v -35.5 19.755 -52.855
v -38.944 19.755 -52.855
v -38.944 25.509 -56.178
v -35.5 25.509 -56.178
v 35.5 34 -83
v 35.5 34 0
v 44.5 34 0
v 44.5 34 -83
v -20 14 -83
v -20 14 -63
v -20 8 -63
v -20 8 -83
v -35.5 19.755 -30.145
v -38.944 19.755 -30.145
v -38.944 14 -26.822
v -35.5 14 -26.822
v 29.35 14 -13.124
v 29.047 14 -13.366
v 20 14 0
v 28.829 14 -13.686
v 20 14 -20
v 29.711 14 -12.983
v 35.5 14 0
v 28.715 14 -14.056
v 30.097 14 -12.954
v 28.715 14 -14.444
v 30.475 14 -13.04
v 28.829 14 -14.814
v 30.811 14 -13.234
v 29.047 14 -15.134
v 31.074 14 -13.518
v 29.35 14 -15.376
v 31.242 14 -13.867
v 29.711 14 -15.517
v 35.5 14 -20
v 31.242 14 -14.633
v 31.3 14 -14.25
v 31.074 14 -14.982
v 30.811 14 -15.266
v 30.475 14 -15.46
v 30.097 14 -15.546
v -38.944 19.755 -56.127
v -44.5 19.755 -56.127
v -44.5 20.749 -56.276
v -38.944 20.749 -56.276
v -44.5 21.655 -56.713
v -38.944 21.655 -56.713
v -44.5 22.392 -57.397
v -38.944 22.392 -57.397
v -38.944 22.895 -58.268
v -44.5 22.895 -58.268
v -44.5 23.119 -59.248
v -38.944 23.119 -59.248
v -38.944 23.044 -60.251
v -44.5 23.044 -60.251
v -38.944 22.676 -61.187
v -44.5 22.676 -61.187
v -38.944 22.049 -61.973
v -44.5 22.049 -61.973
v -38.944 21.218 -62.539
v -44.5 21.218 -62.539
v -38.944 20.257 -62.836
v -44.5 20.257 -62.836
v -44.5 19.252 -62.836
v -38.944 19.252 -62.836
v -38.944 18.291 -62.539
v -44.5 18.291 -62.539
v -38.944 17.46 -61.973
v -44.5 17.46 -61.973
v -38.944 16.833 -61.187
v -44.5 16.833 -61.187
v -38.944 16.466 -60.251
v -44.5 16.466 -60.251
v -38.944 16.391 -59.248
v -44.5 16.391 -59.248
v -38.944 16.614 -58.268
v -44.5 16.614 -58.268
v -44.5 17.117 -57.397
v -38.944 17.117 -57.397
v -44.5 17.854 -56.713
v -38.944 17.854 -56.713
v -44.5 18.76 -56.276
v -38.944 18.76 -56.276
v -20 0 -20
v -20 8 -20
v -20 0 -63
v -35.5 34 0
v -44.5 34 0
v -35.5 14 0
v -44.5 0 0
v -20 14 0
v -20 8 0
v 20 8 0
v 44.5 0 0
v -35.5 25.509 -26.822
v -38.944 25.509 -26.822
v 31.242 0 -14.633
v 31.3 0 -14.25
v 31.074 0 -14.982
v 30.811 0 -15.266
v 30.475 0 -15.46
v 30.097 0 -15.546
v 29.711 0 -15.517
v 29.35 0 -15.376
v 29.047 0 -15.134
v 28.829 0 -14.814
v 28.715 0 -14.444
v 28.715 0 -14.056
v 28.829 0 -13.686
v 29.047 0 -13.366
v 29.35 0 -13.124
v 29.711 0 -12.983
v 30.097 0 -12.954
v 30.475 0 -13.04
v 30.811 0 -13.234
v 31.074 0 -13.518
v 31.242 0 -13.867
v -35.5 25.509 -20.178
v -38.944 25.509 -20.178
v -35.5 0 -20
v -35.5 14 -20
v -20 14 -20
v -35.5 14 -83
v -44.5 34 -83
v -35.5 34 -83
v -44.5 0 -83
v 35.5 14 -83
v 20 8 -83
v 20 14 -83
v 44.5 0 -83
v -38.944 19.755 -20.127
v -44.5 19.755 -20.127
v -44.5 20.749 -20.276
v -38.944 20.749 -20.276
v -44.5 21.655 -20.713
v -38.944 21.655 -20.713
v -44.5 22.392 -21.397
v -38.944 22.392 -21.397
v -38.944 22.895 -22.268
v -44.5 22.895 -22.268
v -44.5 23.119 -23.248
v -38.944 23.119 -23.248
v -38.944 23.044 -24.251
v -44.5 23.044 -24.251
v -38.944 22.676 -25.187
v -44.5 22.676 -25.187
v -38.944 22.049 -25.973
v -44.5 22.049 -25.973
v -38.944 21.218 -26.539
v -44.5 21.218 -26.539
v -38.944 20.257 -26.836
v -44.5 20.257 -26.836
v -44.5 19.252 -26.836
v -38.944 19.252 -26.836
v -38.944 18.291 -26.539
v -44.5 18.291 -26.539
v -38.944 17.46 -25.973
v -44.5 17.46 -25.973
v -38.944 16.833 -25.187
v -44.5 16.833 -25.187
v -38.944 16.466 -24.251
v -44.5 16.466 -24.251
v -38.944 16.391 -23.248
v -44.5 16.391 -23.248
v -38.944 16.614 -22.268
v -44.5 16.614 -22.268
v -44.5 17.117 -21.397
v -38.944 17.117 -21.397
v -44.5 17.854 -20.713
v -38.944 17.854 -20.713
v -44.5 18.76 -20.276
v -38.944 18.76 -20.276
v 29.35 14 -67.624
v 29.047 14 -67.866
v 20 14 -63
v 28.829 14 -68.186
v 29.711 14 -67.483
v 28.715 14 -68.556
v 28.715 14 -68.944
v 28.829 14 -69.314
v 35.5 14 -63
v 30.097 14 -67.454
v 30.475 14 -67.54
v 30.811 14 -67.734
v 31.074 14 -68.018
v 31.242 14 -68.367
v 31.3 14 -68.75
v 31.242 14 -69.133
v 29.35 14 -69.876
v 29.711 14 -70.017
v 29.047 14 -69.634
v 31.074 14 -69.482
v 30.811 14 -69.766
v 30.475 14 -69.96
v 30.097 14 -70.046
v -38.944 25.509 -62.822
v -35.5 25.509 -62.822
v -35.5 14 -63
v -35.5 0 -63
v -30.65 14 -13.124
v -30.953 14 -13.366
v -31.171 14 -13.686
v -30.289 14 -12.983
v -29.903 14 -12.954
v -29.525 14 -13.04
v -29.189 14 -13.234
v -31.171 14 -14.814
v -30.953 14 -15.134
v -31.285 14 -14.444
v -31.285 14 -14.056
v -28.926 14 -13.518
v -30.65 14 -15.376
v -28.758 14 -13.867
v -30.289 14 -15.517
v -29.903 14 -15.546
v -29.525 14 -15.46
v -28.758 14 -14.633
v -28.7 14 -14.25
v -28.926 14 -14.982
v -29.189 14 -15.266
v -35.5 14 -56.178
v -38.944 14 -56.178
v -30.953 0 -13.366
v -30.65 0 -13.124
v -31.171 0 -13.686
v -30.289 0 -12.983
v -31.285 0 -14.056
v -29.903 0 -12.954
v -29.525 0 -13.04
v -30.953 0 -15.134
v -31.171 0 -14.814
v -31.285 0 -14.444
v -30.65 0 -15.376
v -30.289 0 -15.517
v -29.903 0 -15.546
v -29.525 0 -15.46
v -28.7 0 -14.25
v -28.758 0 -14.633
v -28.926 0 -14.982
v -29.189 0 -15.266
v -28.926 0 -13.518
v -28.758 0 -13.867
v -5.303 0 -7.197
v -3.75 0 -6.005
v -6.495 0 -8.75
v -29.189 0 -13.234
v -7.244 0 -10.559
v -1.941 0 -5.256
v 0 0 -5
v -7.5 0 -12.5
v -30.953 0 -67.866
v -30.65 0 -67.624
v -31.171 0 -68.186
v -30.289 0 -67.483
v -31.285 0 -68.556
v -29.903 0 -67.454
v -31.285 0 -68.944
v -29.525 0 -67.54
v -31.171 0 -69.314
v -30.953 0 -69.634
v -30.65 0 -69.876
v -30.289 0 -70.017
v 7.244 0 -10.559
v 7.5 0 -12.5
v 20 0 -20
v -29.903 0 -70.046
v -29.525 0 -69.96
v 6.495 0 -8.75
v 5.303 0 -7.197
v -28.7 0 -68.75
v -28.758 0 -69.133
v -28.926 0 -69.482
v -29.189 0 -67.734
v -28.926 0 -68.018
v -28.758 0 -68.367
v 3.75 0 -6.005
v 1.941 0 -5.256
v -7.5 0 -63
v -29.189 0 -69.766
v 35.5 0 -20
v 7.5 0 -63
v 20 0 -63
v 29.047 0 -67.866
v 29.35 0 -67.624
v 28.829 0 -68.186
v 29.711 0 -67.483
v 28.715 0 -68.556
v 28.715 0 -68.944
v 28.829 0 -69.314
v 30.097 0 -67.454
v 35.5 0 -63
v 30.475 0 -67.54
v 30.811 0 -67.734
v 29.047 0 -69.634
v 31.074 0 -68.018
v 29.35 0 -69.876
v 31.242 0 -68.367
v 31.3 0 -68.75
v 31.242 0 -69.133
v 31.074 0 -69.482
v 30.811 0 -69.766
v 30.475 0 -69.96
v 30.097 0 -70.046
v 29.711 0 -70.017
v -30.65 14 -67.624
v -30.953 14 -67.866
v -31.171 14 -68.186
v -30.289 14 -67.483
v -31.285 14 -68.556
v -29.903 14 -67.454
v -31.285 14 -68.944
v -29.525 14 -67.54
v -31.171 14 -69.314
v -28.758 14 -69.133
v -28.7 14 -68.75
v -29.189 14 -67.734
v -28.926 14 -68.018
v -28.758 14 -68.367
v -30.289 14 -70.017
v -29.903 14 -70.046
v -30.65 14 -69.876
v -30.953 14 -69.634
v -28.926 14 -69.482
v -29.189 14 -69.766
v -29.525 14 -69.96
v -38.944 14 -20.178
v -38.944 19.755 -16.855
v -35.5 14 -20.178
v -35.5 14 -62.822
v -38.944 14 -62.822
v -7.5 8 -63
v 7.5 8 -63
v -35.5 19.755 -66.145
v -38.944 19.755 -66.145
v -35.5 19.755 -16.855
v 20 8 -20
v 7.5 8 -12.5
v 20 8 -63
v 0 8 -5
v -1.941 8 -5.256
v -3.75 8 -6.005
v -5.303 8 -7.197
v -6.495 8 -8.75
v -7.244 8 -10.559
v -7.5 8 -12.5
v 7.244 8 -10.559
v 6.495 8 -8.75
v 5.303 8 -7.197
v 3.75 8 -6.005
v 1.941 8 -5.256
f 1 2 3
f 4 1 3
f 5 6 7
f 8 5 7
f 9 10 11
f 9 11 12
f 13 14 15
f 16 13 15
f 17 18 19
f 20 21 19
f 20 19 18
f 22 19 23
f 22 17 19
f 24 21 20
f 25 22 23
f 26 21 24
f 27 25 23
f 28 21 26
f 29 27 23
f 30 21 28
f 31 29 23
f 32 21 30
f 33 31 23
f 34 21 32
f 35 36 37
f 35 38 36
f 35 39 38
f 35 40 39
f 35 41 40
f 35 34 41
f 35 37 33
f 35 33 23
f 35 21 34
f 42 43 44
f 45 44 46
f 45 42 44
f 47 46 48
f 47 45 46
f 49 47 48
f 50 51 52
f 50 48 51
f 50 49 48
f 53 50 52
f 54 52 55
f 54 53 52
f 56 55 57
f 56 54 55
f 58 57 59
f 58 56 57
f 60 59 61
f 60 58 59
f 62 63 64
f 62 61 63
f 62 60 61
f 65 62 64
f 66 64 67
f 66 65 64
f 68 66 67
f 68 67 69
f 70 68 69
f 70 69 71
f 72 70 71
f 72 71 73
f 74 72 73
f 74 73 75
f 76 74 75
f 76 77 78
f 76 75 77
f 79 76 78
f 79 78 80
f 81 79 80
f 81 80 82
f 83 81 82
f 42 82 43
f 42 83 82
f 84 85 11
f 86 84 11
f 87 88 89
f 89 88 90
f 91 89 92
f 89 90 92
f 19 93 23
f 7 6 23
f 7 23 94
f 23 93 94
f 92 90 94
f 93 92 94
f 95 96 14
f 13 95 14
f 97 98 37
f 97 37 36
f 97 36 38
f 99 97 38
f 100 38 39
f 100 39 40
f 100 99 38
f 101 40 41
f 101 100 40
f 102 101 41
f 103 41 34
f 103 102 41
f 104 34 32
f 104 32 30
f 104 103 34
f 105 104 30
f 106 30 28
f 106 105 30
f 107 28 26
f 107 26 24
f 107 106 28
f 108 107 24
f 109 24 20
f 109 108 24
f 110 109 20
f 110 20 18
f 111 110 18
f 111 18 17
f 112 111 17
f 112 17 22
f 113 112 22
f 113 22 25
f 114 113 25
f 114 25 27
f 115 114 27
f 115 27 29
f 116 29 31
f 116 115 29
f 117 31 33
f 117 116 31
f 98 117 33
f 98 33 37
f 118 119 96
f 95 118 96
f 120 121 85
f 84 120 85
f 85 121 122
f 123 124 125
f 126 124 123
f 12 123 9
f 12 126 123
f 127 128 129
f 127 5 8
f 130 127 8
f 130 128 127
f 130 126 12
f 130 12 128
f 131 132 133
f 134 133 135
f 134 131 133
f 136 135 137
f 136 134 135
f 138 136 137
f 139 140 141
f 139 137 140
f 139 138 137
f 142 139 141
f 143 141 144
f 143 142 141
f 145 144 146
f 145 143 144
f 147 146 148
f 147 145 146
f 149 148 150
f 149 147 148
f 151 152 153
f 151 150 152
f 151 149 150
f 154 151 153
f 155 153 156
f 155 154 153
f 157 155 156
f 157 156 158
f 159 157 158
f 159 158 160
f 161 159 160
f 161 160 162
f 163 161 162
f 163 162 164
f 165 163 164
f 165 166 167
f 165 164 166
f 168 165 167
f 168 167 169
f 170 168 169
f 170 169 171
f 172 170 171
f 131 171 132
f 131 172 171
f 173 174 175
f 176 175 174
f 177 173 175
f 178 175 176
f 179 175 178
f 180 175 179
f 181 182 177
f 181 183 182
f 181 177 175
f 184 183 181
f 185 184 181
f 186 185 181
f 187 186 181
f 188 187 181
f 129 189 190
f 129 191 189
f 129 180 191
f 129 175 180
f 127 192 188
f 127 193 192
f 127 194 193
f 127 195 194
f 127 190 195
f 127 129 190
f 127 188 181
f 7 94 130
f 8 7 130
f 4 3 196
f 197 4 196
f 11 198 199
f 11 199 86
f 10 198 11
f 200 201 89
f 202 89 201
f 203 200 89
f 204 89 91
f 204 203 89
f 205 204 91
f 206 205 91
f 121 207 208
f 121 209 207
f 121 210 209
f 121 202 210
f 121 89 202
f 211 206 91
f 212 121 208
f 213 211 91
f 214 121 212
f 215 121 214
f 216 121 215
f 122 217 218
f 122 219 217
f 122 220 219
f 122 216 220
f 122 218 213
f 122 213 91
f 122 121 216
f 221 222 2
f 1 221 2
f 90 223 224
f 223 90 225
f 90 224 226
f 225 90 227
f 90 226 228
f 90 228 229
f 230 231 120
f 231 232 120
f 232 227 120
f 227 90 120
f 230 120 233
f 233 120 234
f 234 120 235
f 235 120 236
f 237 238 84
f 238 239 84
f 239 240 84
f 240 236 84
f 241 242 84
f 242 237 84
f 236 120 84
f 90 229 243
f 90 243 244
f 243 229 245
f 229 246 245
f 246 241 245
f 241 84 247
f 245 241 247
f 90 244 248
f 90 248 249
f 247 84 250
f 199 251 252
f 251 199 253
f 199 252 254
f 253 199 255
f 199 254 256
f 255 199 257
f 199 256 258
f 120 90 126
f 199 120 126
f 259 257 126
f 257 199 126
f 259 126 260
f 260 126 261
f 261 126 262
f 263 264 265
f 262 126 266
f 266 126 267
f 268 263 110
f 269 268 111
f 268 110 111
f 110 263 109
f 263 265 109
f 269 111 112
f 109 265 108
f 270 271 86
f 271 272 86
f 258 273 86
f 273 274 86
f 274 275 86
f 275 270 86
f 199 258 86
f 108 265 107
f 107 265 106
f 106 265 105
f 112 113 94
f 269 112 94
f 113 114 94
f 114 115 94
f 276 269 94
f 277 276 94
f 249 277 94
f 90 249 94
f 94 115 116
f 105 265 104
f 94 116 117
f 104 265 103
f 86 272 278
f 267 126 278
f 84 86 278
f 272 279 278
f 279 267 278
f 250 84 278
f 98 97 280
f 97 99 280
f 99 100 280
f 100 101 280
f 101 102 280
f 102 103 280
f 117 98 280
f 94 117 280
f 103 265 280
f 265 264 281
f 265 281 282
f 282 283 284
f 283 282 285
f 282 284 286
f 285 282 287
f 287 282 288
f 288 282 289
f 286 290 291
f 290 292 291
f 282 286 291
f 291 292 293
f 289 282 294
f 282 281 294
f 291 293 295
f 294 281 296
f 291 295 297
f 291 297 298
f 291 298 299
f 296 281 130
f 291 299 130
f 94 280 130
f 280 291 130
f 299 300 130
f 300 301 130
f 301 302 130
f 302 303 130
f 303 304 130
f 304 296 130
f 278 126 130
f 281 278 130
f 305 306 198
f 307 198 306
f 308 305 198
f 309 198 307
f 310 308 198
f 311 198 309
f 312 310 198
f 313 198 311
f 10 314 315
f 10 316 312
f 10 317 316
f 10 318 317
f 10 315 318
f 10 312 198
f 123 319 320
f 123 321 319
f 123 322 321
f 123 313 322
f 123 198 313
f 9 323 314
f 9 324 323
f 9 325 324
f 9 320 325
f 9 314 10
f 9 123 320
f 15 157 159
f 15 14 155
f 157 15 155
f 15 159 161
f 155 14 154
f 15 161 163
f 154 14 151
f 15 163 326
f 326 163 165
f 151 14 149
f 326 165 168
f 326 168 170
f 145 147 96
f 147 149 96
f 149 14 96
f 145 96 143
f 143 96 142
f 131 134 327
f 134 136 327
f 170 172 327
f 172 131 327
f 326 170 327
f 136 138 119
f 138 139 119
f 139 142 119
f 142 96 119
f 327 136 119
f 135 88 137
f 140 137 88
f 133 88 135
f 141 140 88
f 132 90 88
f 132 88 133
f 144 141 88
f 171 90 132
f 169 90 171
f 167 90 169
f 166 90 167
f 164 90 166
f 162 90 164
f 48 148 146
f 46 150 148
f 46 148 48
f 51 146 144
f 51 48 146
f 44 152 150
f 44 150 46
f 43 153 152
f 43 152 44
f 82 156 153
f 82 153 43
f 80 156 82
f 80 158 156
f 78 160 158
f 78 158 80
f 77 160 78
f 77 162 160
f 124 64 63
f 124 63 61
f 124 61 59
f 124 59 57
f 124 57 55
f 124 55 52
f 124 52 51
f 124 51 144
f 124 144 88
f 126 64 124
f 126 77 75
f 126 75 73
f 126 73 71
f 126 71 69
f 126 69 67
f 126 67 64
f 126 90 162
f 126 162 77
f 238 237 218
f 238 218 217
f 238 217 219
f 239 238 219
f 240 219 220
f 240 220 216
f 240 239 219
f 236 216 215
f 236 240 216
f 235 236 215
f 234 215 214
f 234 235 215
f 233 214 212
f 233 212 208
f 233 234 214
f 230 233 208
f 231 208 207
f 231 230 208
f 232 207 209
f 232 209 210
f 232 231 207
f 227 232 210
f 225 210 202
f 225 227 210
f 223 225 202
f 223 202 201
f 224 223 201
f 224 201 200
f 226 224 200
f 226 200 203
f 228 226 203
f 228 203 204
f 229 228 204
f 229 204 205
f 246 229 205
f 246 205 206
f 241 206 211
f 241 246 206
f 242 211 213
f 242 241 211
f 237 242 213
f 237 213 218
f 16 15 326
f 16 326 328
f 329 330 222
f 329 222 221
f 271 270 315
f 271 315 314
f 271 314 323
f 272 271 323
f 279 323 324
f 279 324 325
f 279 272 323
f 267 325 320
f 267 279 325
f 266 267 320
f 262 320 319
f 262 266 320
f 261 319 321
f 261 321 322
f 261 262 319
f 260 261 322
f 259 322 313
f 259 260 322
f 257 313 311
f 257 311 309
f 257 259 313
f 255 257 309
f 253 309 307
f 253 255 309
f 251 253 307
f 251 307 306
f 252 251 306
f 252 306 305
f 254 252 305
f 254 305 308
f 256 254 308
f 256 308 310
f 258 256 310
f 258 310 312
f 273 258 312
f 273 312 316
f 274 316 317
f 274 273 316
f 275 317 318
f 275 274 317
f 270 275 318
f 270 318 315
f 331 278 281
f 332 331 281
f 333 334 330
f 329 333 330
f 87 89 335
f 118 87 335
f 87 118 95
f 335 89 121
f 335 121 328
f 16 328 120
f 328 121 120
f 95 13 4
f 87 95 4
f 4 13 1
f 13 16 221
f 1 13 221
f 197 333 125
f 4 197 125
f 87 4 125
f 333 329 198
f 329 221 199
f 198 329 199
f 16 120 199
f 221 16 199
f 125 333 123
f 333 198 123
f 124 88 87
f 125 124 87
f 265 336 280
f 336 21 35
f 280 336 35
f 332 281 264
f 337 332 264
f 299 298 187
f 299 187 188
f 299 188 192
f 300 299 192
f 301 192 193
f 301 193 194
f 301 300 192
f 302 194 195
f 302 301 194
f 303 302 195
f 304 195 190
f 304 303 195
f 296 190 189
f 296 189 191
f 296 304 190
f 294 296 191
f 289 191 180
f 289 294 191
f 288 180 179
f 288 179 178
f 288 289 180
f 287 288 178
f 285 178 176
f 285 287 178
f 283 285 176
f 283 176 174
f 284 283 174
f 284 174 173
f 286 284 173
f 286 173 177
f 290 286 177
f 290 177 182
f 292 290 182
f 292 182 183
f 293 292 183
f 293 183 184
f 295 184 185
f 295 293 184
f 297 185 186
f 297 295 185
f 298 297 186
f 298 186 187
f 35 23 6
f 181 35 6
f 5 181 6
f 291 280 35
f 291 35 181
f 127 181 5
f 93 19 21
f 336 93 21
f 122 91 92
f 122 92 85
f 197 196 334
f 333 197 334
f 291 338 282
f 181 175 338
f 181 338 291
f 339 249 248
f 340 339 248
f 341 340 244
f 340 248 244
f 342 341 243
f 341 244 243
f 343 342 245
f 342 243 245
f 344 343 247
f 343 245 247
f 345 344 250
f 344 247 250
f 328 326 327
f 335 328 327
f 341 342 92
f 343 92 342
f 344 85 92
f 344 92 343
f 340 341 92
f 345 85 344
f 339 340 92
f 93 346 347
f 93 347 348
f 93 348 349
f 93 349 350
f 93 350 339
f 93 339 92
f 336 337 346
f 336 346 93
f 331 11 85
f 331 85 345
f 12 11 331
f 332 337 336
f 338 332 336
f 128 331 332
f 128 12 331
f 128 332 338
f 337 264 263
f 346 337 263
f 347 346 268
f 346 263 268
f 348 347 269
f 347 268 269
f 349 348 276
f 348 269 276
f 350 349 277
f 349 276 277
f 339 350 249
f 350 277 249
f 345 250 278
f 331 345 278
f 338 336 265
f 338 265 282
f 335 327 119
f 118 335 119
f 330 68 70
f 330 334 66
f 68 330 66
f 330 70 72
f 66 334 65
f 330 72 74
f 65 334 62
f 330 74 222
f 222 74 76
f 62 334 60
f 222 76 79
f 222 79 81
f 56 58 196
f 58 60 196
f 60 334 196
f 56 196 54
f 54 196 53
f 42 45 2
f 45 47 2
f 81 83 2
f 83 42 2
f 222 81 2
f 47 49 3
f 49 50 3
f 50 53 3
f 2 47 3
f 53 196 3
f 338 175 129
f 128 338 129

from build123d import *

# Parameters (mm, degrees)
SKETCH1_W                = 89
SKETCH1_H                = 83
SKETCH1_R                = 1.3
MAIN_BODY_DEPTH          = 14
SKETCH2_W                = 40
SKETCH2_H                = 83
SCREW_GROOVE_DEPTH       = 6
SKETCH4_W                = 9
SKETCH4_H                = 83
MOUNT_LIFT_DEPTH         = 20
MOUNT_START              = -5.55625
MOUNT_NUTS_DEPTH         = 18.94375
F_9_32_MOUNT_HOLES_REACH = 7.556
SKETCH5_R                = 3.3734375
SKETCH8_W                = 15.5
SKETCH8_H                = 43
MIDDLE_CUT_DEPTH         = 14


with BuildPart() as part:
    # Sketch1 → Main Body (new body)
    with BuildSketch(Plane(origin=(0, 0, 0), x_dir=(1, 0, 0), z_dir=(0, 1, 0))):
        with Locations((0, 41.5)):
            Rectangle(SKETCH1_W, SKETCH1_H)
        with Locations((-30, 14.25)):
            Circle(SKETCH1_R, mode=Mode.SUBTRACT)
        with Locations((30, 14.25)):
            Circle(SKETCH1_R, mode=Mode.SUBTRACT)
        with BuildLine():
            ThreePointArc((0, 5), (-5.303300859, 7.196699141), (-7.5, 12.5))
            Line((-7.5, 12.5), (-7.5, 63))
            Line((-7.5, 63), (7.5, 63))
            Line((7.5, 63), (7.5, 12.5))
            ThreePointArc((7.5, 12.5), (5.303300859, 7.196699141), (0, 5))
        make_face(mode=Mode.SUBTRACT)
        with Locations((-30, 68.75)):
            Circle(SKETCH1_R, mode=Mode.SUBTRACT)
        with Locations((30, 68.75)):
            Circle(SKETCH1_R, mode=Mode.SUBTRACT)
    extrude(amount=MAIN_BODY_DEPTH)

    # Sketch2 → Screw Groove (cut)
    with BuildSketch(Plane(origin=(0, 14, 0), x_dir=(1, 0, 0), z_dir=(0, 1, 0))):
        with Locations((0, 41.5)):
            Rectangle(SKETCH2_W, SKETCH2_H)
    extrude(amount=-SCREW_GROOVE_DEPTH, mode=Mode.SUBTRACT)

    # Sketch4 → Mount Lift (add)
    with BuildSketch(Plane(origin=(0, 14, 0), x_dir=(1, 0, 0), z_dir=(0, 1, 0))):
        with Locations((-40, 41.5)):
            Rectangle(SKETCH4_W, SKETCH4_H)
        with Locations((40, 41.5)):
            Rectangle(SKETCH4_W, SKETCH4_H)
    extrude(amount=MOUNT_LIFT_DEPTH)

    # Sketch6 → Mount Nuts (cut)
    with BuildSketch(Plane.ZY.offset(44.5).offset(MOUNT_START)):
        Polygon((-52.855059246, 19.7546875), (-56.177529623, 25.509375), (-62.822470377, 25.509375), (-66.144940754, 19.7546875), (-62.822470377, 14), (-56.177529623, 14), align=None)
        Polygon((-16.855059246, 19.7546875), (-20.177529623, 25.509375), (-26.822470377, 25.509375), (-30.144940754, 19.7546875), (-26.822470377, 14), (-20.177529623, 14), align=None)
    extrude(amount=-MOUNT_NUTS_DEPTH, mode=Mode.SUBTRACT)

    # Sketch5 → 9/32 Mount Holes (cut, up to next)
    with BuildSketch(Plane.ZY.offset(38.94375), mode=Mode.PRIVATE) as f_9_32_mount_holes_sk1:
        with Locations((-59.5, 19.7546875)):
            Circle(SKETCH5_R)
    f_9_32_mount_holes_tool1 = extrude(f_9_32_mount_holes_sk1.sketch, amount=F_9_32_MOUNT_HOLES_REACH, mode=Mode.PRIVATE) & part.part
    add(f_9_32_mount_holes_tool1.solids().sort_by_distance((-38.94375, 19.754688, -59.5))[0], mode=Mode.SUBTRACT)
    # Sketch5 → 9/32 Mount Holes (cut, up to next)
    with BuildSketch(Plane.ZY.offset(38.94375), mode=Mode.PRIVATE) as f_9_32_mount_holes_sk2:
        with Locations((-23.5, 19.7546875)):
            Circle(SKETCH5_R)
    f_9_32_mount_holes_tool2 = extrude(f_9_32_mount_holes_sk2.sketch, amount=F_9_32_MOUNT_HOLES_REACH, mode=Mode.PRIVATE) & part.part
    add(f_9_32_mount_holes_tool2.solids().sort_by_distance((-38.94375, 19.754688, -23.5))[0], mode=Mode.SUBTRACT)

    # Sketch8 → Middle Cut (cut)
    with BuildSketch(Plane(origin=(0, 14, 0), x_dir=(1, 0, 0), z_dir=(0, 1, 0))):
        with Locations((-27.75, 41.5)):
            Rectangle(SKETCH8_W, SKETCH8_H)
        with Locations((27.75, 41.5)):
            Rectangle(SKETCH8_W, SKETCH8_H)
    extrude(amount=-MIDDLE_CUT_DEPTH, mode=Mode.SUBTRACT)


solid = part.part
